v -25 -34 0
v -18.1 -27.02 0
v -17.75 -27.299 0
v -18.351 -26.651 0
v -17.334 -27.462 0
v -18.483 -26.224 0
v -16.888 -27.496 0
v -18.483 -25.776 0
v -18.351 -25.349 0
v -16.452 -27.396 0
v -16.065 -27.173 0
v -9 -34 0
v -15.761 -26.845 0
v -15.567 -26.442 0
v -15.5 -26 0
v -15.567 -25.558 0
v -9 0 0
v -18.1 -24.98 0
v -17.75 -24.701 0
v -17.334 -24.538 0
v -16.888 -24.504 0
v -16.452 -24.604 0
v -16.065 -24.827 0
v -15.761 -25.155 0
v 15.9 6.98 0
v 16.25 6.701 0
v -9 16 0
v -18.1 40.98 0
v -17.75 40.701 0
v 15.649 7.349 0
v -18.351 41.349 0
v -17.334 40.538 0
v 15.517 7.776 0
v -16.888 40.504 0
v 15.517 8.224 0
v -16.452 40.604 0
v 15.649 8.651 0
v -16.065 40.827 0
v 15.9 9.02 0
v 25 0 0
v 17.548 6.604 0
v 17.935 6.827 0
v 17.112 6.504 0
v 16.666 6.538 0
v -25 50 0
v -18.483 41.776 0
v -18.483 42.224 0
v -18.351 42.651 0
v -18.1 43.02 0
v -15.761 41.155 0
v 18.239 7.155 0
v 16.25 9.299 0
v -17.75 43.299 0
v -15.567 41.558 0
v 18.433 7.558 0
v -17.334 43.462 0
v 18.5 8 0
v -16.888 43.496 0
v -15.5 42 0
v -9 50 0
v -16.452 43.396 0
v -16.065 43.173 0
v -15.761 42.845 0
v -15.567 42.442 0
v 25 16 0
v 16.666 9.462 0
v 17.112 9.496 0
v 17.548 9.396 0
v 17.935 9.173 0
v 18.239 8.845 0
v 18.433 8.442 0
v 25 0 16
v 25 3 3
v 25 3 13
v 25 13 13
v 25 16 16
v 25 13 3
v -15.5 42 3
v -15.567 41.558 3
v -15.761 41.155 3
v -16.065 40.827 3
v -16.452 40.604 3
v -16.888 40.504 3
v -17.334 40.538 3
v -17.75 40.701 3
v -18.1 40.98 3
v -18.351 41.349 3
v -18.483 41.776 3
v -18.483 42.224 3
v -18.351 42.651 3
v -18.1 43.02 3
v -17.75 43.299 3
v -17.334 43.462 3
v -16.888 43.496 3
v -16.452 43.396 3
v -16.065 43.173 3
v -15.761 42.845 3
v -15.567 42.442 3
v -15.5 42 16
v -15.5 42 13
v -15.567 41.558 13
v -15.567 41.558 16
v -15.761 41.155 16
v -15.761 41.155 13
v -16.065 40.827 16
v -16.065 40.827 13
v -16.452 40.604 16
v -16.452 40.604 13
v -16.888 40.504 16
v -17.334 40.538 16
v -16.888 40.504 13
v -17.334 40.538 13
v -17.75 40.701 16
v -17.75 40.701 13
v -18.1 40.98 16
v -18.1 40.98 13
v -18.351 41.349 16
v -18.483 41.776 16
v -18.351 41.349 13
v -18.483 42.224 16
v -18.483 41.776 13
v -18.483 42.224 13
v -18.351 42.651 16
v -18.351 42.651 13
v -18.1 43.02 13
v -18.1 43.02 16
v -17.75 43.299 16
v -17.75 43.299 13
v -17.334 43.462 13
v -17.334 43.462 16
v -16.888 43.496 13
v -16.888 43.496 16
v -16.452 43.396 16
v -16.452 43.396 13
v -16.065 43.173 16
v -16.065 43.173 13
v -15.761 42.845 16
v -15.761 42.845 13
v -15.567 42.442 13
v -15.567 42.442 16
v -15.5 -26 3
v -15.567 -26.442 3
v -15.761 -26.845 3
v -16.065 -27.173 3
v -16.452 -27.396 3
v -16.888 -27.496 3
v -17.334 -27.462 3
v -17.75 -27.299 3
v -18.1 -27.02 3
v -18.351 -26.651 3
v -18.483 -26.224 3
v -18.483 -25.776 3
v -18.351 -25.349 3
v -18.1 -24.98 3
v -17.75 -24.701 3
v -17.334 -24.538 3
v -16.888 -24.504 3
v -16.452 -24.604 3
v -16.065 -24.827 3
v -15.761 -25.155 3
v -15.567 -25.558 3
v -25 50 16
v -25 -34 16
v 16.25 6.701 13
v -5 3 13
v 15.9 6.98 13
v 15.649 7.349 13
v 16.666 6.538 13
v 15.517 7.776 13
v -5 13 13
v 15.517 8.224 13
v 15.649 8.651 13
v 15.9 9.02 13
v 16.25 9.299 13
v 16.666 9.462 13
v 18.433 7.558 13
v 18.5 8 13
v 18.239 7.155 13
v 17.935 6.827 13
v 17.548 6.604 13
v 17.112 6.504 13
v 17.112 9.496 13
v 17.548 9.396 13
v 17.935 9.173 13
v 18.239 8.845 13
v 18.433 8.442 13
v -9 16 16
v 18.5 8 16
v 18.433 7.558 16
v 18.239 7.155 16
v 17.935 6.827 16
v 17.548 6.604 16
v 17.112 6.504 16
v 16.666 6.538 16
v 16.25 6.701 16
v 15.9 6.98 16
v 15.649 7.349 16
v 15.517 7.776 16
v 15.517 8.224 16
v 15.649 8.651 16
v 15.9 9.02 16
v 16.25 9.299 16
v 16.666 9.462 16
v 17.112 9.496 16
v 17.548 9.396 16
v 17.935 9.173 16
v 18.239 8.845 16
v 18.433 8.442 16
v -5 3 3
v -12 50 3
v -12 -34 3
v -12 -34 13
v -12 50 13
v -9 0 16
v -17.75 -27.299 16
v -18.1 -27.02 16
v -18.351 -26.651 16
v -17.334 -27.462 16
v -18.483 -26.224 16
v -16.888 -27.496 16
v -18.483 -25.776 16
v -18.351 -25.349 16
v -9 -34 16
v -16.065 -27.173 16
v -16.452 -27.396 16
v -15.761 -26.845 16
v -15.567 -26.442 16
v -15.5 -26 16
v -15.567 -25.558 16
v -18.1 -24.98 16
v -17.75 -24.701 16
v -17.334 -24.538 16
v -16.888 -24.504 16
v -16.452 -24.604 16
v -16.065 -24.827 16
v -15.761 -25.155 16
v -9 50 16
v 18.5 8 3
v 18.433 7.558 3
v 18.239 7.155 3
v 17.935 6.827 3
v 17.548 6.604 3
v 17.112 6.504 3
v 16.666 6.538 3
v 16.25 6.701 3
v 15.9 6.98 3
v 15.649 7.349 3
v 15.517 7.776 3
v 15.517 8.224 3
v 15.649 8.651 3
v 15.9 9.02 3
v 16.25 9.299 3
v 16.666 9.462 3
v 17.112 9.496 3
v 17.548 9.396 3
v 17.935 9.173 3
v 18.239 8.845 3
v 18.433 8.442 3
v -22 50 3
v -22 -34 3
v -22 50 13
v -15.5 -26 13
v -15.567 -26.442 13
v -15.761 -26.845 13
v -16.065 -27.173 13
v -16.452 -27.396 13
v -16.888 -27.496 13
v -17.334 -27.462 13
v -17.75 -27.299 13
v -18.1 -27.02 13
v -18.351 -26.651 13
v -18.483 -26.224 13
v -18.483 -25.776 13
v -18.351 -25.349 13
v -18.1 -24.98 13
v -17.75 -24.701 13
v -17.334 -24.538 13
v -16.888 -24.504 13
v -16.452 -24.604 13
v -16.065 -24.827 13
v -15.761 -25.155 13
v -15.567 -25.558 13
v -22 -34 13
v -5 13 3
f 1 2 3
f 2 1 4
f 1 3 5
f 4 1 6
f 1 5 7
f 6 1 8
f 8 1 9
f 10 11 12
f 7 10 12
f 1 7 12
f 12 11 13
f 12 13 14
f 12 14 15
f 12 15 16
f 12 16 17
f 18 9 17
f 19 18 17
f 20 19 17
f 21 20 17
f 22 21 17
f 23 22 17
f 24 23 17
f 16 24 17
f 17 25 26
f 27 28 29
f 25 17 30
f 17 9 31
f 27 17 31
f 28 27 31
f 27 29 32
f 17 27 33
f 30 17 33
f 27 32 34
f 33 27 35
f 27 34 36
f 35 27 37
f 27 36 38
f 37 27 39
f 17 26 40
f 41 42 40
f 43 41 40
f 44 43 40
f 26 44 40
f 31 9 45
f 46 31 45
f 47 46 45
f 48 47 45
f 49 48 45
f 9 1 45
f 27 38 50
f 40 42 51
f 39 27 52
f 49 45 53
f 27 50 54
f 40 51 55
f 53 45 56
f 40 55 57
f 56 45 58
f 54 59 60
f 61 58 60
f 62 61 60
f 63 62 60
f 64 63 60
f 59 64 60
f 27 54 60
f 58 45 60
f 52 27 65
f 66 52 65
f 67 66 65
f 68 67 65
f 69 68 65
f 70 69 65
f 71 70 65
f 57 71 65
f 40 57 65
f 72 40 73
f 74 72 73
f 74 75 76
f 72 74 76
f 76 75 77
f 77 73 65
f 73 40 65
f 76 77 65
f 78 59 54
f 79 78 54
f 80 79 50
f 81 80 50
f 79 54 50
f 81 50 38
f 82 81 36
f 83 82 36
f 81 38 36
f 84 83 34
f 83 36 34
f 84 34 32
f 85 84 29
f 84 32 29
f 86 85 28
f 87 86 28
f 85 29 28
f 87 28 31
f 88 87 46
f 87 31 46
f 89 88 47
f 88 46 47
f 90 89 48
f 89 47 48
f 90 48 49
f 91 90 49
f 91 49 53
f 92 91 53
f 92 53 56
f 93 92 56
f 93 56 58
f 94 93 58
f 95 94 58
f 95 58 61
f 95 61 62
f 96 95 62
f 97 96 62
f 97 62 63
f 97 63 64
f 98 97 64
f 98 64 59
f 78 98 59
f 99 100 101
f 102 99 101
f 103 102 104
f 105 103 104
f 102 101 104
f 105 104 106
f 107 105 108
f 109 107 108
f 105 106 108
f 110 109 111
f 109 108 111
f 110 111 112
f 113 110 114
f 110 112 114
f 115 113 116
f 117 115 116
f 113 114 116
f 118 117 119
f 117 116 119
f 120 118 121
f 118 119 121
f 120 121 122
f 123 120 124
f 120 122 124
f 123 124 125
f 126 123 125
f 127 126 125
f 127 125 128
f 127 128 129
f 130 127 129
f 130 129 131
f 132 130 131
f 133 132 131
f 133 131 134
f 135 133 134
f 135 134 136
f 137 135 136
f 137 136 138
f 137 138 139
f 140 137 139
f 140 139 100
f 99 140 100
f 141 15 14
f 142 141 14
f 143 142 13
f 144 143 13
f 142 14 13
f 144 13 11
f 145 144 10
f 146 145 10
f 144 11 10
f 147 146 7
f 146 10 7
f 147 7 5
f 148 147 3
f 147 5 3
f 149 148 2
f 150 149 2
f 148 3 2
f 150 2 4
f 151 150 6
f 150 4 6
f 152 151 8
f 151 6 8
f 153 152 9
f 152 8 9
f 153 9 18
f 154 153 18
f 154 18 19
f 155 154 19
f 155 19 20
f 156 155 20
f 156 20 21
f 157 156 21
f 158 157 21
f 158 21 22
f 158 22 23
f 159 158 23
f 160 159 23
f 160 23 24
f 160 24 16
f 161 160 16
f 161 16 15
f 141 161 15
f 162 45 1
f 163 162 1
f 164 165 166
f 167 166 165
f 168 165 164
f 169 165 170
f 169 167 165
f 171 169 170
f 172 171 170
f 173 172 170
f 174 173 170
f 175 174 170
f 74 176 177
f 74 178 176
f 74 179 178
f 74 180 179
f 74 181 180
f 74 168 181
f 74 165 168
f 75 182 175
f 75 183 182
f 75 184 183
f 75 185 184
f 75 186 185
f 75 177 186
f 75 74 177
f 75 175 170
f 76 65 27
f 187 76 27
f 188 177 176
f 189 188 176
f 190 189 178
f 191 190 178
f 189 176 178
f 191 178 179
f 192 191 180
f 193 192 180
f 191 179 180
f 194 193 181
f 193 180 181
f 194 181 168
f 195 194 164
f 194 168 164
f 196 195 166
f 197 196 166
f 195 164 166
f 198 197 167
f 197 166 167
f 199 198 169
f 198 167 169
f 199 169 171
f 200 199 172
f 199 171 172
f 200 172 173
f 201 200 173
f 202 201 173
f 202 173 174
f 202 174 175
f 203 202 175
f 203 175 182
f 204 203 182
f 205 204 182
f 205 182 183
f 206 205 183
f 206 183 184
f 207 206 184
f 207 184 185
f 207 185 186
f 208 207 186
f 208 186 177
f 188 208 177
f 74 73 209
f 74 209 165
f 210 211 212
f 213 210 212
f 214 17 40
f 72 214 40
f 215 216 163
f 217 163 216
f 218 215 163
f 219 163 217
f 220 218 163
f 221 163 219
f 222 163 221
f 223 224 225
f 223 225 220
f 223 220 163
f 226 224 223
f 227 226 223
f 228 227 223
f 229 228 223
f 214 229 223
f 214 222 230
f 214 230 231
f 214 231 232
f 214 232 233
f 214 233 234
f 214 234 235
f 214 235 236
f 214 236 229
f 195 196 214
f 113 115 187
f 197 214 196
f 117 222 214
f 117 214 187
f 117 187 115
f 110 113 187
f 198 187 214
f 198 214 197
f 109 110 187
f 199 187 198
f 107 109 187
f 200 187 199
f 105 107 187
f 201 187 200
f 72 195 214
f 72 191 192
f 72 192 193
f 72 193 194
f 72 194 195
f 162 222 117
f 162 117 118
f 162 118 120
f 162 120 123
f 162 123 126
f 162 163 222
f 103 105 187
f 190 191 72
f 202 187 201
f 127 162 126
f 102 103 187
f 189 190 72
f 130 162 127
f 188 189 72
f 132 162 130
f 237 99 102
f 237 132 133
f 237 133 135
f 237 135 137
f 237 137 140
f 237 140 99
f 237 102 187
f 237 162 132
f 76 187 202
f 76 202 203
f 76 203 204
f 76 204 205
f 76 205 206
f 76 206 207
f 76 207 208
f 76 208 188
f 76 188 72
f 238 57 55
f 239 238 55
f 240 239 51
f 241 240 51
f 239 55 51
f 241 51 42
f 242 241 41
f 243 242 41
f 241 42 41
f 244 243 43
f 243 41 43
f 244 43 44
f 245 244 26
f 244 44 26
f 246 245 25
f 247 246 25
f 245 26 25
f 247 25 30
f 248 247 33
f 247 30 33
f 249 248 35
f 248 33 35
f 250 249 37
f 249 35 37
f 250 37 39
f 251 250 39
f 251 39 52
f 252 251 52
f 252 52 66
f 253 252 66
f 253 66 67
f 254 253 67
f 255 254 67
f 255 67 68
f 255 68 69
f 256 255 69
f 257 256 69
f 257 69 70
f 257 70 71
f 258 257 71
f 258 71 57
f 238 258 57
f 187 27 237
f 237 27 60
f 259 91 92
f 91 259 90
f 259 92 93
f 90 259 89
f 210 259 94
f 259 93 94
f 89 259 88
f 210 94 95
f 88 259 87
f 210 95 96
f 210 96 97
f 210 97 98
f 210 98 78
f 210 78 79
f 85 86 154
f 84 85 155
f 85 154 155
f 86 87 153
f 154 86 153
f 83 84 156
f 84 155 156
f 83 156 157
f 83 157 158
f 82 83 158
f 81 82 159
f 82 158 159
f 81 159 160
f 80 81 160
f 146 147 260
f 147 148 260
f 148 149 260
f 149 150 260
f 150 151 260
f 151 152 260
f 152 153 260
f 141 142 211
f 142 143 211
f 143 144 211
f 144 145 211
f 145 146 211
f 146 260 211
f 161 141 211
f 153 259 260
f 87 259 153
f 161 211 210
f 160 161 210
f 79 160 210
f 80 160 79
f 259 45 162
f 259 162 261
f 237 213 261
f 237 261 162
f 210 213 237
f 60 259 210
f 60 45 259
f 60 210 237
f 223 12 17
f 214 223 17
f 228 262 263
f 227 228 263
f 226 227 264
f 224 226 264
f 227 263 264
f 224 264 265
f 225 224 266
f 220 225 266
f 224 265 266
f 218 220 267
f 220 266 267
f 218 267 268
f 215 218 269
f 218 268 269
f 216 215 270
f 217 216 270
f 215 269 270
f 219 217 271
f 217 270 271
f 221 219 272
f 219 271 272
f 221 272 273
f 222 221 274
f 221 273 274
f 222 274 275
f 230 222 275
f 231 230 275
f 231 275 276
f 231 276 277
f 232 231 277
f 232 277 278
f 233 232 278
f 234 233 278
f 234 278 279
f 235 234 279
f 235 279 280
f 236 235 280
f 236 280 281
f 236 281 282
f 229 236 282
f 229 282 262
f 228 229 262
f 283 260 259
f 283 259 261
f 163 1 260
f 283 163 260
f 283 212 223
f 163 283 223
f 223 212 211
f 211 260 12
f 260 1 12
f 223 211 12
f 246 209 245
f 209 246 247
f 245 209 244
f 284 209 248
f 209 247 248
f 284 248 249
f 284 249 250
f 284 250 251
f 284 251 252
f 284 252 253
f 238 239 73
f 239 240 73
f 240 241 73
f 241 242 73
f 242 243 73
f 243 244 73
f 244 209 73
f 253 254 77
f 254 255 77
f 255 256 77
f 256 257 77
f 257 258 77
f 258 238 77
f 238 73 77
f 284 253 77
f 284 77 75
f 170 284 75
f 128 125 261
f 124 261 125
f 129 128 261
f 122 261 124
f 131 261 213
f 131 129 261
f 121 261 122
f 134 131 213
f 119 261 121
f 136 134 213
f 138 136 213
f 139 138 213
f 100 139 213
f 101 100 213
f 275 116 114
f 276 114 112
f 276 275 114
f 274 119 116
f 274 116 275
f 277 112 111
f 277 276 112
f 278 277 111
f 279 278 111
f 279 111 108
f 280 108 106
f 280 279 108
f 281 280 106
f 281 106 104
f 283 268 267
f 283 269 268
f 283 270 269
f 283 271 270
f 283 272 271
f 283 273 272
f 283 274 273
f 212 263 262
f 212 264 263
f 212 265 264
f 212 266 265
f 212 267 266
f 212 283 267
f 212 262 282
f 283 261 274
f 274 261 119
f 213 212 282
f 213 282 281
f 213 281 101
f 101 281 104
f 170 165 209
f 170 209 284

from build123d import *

# Parameters (mm, degrees)
F0_W     = 16
F0_H     = 34
F1_DEPTH = 16
F2_W     = 10
F2_H     = 10
F3_DEPTH = 30
F4_W     = 10
F4_H     = 10
F5_DEPTH = 84
F6_R     = 1.5
F7_DEPTH = 16


with BuildPart() as f1:
    # F0 (on Top) → F1 (new body)
    with BuildSketch(Plane.XY):
        with Locations((-17, 33)):
            Rectangle(F0_W, F0_H)
        Polygon((-9, 16), (-25, 16), (-25, 0), (-9, 0), (25, 0), (25, 16), align=None)
        with Locations((-17, -17)):
            Rectangle(F0_W, F0_H)
    extrude(amount=F1_DEPTH)

    # F2 (on face) → F3 (cut)
    with BuildSketch(Plane.YZ.offset(25)):
        with Locations((8, 8)):
            Rectangle(F2_W, F2_H)
    extrude(amount=-F3_DEPTH, mode=Mode.SUBTRACT)

    # F4 (on face) → F5 (cut)
    with BuildSketch(Plane.XZ.offset(34)):
        with Locations((-17, 8)):
            Rectangle(F4_W, F4_H)
    extrude(amount=-F5_DEPTH, mode=Mode.SUBTRACT)

    # F6 (on face) → F7 (cut)
    with BuildSketch(Plane(origin=(0, 0, 0), x_dir=(1, 0, 0), z_dir=(0, 0, -1))):
        with Locations((-17, -42)):
            Circle(F6_R)
        with Locations((17, -8)):
            Circle(F6_R)
        with Locations((-17, 26)):
            Circle(F6_R)
    extrude(amount=-F7_DEPTH, mode=Mode.SUBTRACT)


solid = f1.part
